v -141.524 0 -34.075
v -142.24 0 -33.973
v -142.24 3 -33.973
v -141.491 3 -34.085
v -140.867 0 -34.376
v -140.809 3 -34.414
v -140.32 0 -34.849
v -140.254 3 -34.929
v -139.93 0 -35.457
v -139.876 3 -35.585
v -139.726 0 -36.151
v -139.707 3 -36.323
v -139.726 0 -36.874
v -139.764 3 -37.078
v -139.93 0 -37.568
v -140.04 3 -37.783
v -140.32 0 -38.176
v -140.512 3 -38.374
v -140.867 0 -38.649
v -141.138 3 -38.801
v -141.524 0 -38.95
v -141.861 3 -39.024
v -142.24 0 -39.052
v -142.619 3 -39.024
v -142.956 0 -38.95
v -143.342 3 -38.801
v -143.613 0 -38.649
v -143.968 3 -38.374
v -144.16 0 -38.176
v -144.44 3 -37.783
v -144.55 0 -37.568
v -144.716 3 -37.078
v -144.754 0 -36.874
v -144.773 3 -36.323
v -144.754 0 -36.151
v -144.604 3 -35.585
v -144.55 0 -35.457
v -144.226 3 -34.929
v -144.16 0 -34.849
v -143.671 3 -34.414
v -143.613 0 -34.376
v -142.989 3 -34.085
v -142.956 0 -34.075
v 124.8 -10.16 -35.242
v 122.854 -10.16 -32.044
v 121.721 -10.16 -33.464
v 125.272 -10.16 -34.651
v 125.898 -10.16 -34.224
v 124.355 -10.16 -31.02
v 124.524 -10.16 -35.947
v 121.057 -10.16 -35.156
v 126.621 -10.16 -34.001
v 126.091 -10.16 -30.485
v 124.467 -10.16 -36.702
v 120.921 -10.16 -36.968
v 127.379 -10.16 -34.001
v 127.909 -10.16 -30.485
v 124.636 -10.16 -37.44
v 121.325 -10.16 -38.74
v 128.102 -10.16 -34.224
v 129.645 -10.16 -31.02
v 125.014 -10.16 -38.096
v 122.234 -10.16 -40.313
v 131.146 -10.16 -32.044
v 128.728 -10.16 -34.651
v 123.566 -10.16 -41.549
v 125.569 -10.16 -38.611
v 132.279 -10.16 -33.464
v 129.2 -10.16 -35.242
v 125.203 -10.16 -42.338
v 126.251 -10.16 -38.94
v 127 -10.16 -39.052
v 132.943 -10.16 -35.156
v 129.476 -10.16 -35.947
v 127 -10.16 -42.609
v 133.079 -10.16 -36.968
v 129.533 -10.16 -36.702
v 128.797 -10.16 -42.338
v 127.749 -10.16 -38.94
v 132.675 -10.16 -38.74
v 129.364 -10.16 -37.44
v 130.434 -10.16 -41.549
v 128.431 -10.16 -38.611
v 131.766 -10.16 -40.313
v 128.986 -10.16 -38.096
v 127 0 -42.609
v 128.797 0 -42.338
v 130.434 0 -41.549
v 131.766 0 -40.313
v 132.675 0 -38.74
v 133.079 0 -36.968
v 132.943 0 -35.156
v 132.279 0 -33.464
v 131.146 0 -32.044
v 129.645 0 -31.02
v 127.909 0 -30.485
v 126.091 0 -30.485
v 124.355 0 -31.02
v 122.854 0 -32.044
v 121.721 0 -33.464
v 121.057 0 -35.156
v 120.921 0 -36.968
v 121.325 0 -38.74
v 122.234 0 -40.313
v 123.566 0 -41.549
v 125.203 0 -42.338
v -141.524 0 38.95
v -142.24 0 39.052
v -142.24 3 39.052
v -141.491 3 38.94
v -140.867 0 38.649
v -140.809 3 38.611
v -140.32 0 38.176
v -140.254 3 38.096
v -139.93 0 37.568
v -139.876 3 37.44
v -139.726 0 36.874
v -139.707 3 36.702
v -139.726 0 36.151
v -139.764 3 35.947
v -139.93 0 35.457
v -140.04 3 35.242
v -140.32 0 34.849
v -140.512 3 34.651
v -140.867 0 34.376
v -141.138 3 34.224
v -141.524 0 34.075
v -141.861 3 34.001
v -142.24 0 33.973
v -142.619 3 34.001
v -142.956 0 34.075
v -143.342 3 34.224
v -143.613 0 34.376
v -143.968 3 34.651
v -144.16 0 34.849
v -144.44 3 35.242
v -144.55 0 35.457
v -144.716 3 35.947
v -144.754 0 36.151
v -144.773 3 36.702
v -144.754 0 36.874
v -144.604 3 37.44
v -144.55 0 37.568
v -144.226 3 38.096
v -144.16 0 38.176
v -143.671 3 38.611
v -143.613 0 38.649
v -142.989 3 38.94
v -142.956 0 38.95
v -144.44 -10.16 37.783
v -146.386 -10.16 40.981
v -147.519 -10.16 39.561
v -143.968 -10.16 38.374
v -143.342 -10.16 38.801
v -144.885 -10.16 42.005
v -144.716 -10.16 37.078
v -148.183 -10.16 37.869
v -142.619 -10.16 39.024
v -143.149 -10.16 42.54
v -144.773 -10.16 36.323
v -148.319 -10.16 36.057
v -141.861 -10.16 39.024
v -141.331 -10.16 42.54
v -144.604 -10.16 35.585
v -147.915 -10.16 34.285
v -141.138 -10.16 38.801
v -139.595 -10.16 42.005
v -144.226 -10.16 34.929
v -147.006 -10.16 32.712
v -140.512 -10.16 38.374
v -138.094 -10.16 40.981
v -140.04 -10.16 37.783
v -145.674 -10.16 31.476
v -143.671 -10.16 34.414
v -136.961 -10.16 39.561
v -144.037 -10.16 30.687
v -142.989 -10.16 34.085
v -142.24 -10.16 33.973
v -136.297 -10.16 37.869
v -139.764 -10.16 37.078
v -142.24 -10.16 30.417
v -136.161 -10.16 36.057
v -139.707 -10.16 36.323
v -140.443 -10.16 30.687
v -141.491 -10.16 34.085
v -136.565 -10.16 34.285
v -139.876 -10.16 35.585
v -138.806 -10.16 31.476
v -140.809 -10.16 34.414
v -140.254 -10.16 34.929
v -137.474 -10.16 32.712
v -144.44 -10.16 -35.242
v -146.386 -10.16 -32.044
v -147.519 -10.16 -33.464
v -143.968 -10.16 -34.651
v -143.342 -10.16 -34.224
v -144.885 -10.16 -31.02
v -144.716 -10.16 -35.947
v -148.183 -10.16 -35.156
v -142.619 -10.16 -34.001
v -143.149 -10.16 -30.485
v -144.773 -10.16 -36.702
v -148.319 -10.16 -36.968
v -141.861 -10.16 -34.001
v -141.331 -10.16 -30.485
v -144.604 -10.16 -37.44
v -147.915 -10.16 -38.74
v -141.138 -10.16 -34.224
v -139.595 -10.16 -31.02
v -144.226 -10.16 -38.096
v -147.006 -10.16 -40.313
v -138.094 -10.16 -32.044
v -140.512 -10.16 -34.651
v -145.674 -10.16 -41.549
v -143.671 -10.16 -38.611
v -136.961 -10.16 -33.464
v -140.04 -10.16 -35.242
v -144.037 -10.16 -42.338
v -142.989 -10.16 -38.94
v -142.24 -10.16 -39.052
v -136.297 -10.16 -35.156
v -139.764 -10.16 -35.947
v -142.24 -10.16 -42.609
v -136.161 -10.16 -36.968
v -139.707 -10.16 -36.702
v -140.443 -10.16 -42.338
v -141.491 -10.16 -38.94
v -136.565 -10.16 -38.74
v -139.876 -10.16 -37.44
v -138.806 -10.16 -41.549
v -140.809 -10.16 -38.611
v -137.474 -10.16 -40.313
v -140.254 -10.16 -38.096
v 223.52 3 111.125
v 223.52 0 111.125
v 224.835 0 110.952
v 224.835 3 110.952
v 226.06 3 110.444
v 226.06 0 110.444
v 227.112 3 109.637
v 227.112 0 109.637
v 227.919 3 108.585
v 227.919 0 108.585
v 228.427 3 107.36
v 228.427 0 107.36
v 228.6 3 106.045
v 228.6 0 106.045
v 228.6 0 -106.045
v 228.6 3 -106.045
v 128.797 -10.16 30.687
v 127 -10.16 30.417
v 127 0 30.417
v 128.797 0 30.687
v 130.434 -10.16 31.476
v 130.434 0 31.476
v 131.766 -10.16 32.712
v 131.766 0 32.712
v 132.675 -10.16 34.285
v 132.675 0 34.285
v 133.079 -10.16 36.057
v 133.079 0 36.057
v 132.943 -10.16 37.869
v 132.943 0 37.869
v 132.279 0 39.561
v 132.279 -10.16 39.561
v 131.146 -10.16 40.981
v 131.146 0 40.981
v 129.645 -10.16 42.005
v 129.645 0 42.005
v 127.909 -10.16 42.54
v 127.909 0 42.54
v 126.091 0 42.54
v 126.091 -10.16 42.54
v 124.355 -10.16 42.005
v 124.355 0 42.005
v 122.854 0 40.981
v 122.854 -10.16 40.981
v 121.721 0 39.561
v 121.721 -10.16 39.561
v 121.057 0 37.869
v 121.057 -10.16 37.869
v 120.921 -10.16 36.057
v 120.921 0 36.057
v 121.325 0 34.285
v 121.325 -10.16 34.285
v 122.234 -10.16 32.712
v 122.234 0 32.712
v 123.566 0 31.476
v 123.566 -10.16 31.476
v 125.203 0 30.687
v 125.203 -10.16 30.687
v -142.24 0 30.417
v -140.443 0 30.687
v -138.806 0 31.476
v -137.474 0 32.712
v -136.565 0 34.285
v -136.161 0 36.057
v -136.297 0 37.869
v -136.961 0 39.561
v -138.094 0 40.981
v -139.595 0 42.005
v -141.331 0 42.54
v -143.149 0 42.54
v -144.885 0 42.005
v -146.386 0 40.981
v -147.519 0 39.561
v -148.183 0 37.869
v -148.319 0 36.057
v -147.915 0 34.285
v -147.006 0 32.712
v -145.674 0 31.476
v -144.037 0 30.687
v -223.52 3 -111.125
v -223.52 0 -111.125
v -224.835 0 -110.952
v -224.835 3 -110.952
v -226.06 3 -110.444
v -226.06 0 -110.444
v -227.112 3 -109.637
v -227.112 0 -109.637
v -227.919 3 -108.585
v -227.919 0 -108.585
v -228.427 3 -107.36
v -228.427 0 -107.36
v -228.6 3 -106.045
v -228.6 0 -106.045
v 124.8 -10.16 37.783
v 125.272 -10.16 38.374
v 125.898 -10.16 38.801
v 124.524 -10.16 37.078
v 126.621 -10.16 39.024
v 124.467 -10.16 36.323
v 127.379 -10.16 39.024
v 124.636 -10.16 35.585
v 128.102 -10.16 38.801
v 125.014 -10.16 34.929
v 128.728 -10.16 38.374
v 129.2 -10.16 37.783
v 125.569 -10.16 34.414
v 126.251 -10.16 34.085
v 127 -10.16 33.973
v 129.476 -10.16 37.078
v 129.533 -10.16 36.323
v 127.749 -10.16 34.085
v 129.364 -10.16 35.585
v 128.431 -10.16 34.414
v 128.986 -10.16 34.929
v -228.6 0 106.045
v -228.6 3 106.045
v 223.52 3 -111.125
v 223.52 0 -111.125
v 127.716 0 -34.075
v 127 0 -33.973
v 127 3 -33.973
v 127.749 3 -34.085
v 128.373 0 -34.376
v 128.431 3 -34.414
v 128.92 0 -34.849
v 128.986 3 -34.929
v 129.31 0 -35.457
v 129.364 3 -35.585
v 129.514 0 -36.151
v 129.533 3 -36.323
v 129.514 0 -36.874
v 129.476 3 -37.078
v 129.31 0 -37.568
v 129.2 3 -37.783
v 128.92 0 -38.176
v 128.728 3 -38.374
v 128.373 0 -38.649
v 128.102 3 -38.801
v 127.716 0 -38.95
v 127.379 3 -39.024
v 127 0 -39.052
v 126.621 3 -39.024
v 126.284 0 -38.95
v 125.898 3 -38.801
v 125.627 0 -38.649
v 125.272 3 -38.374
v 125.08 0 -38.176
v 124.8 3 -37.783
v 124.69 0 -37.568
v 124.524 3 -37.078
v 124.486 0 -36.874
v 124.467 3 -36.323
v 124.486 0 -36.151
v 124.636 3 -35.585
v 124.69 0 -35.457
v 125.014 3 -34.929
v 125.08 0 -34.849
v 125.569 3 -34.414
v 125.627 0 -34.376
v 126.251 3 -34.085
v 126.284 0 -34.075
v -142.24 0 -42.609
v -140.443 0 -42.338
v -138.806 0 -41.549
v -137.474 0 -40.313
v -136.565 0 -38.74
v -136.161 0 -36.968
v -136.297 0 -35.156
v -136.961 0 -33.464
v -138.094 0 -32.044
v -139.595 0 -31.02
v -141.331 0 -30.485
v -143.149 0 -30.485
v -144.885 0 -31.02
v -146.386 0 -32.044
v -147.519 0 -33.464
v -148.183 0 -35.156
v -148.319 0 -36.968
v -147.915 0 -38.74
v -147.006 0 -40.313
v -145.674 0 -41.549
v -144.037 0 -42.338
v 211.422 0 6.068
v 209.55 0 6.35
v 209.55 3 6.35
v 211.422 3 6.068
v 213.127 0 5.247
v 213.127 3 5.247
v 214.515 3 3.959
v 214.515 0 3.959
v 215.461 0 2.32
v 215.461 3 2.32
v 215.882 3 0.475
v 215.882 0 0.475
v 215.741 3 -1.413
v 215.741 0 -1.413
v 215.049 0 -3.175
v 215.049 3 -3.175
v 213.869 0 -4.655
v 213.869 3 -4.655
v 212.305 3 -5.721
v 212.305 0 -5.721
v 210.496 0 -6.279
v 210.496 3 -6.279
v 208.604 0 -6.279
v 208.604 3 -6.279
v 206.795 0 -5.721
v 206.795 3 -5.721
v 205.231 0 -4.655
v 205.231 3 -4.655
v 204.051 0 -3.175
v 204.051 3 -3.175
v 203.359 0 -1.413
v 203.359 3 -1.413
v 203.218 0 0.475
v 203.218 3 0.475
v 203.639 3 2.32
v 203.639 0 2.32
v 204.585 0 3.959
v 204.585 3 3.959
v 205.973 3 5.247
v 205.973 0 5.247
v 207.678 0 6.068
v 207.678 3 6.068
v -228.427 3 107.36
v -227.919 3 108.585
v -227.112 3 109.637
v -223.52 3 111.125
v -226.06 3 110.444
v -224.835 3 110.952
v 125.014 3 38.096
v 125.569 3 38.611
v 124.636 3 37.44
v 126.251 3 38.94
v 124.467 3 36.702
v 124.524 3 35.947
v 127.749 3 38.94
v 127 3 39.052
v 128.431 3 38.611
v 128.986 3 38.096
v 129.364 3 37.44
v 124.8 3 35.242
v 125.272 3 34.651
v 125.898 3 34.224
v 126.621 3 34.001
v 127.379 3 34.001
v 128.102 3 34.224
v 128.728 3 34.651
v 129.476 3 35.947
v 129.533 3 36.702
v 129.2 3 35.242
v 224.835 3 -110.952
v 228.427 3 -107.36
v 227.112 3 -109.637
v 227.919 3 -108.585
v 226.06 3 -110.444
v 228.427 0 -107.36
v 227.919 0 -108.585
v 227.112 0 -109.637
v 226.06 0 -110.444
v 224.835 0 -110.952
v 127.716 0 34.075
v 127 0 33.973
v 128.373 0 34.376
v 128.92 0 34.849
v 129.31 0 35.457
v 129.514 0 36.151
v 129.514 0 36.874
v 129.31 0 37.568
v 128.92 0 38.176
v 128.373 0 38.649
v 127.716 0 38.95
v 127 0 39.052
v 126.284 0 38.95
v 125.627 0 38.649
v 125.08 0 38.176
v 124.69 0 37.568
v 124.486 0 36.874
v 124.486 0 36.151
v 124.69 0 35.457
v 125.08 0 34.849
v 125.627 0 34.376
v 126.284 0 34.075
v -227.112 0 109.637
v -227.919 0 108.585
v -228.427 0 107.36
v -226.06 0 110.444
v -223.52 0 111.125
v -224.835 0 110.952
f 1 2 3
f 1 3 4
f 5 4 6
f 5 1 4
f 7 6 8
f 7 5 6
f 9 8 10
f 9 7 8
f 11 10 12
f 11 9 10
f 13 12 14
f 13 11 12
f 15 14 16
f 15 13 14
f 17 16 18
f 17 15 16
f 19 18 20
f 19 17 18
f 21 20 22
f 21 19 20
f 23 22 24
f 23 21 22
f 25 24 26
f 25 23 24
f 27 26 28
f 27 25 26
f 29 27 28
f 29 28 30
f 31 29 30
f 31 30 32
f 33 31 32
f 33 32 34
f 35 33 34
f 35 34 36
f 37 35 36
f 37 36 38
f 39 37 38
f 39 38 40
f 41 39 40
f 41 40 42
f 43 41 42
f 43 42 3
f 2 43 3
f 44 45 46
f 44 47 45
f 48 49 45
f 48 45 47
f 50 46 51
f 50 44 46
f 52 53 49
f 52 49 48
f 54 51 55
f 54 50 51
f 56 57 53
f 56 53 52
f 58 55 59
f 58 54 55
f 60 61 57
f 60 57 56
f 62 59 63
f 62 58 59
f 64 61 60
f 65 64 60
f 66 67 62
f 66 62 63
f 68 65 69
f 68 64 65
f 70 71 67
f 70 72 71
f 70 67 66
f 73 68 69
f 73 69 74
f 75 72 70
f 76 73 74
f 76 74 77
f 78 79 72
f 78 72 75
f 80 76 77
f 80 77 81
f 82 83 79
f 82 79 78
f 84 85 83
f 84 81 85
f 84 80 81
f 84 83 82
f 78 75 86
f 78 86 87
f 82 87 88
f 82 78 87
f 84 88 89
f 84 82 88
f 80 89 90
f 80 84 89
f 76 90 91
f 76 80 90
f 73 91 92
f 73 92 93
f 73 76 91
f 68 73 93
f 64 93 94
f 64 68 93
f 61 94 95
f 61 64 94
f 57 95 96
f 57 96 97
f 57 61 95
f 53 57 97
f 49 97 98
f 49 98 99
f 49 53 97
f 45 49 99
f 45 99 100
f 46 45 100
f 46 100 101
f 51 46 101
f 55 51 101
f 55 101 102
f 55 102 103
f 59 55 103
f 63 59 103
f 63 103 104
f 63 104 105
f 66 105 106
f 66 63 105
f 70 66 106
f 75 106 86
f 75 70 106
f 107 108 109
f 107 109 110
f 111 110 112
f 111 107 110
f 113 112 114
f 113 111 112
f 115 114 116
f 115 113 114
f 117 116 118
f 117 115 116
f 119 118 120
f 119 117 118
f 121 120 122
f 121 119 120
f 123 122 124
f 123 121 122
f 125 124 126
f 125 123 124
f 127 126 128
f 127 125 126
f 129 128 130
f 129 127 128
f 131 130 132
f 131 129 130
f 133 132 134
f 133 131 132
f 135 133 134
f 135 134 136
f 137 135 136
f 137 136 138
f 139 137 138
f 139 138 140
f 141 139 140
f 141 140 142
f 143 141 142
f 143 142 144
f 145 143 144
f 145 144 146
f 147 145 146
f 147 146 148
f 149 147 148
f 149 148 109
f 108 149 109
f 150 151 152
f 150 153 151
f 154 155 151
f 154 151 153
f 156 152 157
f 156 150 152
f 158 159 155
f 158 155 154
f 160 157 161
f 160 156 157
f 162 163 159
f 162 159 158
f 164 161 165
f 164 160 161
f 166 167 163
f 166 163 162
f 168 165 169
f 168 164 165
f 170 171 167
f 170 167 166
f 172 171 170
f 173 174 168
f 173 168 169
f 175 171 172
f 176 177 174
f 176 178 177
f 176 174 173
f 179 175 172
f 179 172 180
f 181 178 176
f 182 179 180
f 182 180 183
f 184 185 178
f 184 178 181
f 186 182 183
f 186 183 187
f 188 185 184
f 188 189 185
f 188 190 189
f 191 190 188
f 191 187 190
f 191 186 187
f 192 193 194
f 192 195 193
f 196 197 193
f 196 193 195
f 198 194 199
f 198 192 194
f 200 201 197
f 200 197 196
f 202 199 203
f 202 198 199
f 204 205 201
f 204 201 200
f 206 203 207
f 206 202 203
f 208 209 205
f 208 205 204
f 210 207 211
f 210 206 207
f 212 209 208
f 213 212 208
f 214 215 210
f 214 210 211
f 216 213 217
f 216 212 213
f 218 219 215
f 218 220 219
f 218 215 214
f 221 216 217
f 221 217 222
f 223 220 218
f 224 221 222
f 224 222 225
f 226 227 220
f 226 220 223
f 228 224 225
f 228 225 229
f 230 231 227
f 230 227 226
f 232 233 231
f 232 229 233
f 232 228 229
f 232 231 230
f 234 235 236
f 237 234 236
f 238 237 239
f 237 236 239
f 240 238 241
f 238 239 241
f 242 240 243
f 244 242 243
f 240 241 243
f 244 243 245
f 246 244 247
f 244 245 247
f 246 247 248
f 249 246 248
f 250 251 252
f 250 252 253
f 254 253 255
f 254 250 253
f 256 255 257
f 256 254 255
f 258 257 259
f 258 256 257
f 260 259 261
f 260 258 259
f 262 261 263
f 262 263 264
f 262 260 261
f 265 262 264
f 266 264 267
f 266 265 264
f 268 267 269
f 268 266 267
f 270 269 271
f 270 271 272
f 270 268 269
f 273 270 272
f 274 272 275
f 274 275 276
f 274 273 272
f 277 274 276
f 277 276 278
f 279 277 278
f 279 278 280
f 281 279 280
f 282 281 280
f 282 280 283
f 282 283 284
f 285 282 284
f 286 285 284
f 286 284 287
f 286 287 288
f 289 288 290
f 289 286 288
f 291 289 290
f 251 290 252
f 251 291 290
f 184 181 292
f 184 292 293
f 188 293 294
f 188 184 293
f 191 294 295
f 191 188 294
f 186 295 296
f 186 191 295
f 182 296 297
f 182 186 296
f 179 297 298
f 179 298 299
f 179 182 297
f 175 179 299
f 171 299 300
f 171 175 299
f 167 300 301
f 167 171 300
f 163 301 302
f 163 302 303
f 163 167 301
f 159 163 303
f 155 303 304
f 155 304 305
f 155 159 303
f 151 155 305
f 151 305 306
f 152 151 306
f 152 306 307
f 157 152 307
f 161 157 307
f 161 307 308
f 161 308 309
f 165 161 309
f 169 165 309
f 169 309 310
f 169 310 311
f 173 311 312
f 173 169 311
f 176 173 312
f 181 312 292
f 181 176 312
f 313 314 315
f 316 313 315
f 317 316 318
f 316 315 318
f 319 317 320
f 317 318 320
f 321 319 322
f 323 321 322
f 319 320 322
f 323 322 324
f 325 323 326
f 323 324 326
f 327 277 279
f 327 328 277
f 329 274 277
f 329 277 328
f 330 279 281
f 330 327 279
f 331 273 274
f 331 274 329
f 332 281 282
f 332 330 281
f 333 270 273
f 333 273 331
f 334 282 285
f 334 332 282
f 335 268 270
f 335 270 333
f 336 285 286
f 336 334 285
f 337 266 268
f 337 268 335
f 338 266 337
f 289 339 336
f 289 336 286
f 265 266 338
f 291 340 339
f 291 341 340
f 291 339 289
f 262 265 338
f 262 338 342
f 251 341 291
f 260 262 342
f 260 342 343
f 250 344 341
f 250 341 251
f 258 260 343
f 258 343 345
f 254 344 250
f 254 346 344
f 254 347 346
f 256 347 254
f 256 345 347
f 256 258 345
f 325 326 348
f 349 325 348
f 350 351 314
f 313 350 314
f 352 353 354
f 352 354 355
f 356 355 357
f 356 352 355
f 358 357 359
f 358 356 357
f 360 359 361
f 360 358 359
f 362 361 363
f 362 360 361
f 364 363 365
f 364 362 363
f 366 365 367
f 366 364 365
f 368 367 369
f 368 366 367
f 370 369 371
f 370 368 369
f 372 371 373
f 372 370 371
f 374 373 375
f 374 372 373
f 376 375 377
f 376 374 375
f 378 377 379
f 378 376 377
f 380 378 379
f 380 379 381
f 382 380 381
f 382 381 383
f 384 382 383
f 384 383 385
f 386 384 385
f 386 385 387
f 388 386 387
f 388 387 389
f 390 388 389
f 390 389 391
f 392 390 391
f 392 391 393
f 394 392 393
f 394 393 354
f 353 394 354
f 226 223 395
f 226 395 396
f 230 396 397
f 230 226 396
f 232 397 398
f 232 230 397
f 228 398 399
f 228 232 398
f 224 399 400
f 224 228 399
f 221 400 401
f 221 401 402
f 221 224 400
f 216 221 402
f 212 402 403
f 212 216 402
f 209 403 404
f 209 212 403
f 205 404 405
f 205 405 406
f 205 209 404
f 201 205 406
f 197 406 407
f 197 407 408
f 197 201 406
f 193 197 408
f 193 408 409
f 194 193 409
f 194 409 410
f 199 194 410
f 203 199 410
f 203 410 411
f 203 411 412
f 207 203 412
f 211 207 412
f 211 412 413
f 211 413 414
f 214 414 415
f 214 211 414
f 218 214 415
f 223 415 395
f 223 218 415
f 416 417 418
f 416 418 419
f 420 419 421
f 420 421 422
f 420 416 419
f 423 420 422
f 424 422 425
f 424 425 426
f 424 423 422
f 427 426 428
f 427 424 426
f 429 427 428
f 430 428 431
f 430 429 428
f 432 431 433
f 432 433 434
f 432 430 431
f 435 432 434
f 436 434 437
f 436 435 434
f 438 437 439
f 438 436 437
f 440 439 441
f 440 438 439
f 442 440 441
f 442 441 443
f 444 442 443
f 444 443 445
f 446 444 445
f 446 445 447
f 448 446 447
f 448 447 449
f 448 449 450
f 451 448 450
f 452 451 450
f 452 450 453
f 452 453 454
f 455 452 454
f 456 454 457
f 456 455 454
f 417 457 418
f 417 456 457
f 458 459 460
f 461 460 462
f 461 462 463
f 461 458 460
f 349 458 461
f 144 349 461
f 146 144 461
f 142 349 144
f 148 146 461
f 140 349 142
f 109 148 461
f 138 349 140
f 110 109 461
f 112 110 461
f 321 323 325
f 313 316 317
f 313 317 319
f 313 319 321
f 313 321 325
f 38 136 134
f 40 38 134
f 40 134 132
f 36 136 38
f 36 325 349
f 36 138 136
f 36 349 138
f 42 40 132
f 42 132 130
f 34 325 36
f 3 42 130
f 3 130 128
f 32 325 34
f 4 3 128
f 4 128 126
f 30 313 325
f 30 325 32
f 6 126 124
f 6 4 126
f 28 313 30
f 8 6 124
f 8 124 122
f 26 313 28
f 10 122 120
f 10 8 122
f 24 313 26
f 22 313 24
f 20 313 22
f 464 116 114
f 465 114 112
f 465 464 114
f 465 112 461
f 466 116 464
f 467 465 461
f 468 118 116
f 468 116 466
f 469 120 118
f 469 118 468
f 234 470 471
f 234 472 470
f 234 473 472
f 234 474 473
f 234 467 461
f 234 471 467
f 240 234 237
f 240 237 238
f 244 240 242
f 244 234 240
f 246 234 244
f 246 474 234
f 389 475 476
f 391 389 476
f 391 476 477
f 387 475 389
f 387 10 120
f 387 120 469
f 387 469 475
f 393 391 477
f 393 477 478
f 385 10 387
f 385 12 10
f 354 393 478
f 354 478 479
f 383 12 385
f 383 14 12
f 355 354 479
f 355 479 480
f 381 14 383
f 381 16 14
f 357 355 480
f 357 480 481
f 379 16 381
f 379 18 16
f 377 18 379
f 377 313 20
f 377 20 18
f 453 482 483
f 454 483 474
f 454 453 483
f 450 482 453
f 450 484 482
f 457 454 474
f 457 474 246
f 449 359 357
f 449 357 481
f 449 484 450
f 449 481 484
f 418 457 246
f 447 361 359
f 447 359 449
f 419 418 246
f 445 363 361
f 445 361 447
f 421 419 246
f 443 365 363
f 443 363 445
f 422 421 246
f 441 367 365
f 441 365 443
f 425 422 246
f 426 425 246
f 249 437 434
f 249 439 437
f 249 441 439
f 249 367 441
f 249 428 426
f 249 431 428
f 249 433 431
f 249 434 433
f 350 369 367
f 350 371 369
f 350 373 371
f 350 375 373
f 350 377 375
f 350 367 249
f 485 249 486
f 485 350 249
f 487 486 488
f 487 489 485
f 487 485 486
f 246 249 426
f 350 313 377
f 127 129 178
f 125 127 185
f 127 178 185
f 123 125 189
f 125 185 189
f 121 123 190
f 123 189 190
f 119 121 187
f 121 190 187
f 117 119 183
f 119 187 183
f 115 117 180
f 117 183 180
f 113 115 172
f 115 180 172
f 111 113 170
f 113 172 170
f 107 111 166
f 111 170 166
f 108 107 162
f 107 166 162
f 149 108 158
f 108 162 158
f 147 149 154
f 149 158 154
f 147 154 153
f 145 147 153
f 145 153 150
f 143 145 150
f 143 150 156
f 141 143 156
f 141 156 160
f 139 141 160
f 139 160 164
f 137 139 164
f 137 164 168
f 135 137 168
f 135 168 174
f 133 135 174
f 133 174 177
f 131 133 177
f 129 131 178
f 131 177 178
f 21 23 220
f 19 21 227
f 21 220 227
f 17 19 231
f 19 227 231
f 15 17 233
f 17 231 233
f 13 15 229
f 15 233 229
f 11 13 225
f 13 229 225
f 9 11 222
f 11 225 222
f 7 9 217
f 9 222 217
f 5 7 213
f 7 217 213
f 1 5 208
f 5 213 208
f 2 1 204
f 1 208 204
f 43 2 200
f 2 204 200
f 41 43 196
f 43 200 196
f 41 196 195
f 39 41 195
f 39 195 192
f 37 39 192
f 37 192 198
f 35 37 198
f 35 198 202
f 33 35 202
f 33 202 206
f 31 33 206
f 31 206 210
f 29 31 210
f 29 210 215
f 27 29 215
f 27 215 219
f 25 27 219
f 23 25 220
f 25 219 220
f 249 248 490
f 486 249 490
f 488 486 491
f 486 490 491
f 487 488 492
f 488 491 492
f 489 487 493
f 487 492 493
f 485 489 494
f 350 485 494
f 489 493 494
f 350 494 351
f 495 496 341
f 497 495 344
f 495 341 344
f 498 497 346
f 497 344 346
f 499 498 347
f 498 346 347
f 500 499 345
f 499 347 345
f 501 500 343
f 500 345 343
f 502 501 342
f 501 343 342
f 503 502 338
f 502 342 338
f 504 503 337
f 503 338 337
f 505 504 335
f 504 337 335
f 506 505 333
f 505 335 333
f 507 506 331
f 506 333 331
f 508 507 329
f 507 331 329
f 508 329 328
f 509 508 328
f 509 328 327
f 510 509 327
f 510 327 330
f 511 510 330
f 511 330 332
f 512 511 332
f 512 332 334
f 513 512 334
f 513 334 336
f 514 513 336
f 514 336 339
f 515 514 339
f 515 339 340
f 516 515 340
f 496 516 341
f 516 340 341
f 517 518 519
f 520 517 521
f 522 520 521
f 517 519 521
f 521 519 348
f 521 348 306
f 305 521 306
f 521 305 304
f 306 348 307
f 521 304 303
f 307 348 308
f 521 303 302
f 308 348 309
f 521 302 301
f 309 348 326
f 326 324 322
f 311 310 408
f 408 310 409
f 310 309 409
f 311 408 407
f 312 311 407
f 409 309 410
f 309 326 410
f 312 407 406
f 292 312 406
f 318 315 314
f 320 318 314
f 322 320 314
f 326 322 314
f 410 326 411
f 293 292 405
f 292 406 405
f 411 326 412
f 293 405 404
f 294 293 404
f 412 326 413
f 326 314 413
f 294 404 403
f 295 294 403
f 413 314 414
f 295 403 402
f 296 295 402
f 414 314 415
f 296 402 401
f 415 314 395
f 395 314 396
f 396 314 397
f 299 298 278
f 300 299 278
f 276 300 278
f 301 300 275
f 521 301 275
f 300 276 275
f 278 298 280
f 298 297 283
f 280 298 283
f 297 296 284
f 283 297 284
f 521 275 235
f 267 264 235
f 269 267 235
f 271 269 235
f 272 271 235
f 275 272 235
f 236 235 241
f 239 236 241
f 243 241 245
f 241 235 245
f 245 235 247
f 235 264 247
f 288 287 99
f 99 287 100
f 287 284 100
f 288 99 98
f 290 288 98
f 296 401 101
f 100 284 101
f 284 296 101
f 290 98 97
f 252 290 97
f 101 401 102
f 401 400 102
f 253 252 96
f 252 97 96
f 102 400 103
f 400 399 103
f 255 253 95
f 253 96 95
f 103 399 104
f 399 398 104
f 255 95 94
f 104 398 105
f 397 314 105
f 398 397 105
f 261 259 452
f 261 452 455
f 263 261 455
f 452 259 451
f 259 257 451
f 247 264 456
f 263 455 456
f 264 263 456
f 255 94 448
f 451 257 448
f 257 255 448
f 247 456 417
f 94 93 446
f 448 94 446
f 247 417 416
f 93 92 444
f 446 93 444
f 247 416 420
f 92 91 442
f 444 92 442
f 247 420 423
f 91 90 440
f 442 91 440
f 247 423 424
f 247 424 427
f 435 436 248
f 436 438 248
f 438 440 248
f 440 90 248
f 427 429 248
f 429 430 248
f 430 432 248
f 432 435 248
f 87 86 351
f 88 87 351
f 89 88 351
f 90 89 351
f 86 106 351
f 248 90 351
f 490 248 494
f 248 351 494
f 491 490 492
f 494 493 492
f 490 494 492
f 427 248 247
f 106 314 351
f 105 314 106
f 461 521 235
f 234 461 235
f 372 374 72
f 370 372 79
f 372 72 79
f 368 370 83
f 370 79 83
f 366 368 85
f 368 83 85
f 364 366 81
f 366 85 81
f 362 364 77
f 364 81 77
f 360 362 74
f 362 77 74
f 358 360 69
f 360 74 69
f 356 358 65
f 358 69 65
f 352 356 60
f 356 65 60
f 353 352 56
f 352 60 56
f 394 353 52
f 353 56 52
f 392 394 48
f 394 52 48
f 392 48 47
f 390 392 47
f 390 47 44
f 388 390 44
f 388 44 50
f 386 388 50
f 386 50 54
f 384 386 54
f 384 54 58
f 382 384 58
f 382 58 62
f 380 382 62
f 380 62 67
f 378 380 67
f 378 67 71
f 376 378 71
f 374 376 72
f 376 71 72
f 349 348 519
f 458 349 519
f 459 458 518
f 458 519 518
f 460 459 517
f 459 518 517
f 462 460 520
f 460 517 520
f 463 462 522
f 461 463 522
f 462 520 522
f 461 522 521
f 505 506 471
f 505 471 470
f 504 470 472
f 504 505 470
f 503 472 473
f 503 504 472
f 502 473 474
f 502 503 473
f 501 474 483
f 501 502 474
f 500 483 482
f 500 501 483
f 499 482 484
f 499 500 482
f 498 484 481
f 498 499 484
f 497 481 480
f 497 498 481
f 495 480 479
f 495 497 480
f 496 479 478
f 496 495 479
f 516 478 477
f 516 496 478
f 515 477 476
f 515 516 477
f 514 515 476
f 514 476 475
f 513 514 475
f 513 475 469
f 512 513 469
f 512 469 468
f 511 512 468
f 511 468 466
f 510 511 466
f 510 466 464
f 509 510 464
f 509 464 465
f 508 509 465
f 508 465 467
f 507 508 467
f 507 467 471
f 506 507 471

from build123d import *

# Parameters (mm, degrees)
SKETCH1_R               = 2.54
SKETCH1_R_2             = 6.35
MAINBASEPLATE_DEPTH     = 3
BASEBOSS_EXTRUDE2_START = 10.16
SKETCH2_R               = 6.096
SKETCH2_R_2             = 2.54
BASEBOSS_EXTRUDE2_DEPTH = 10.16


with BuildPart() as part:
    # Sketch1 → mainbaseplate (new body)
    with BuildSketch(Plane(origin=(0, 0, 0), x_dir=(1, 0, 0), z_dir=(0, 1, 0))):
        with BuildLine():
            Line((-223.52, -111.125), (223.52, -111.125))
            ThreePointArc((223.52, -111.125), (227.112102448, -109.637102448), (228.6, -106.045))
            Line((228.6, -106.045), (228.6, 106.045))
            ThreePointArc((228.6, 106.045), (227.112102448, 109.637102448), (223.52, 111.125))
            Line((223.52, 111.125), (-223.52, 111.125))
            ThreePointArc((-223.52, 111.125), (-227.112102448, 109.637102448), (-228.6, 106.045))
            Line((-228.6, 106.045), (-228.6, -106.045))
            ThreePointArc((-228.6, -106.045), (-227.112102448, -109.637102448), (-223.52, -111.125))
        make_face()
        with Locations((127, 36.5125)):
            Circle(SKETCH1_R, mode=Mode.SUBTRACT)
        with Locations((127, -36.5125)):
            Circle(SKETCH1_R, mode=Mode.SUBTRACT)
        with Locations((-142.24, 36.5125)):
            Circle(SKETCH1_R, mode=Mode.SUBTRACT)
        with Locations((-142.24, -36.5125)):
            Circle(SKETCH1_R, mode=Mode.SUBTRACT)
        with Locations((209.55, 0)):
            Circle(SKETCH1_R_2, mode=Mode.SUBTRACT)
    extrude(amount=MAINBASEPLATE_DEPTH)

    # Sketch2 → BaseBoss-Extrude2 (add)
    # profile 1 of 4: a face of its own
    with BuildSketch(Plane.XZ.offset(BASEBOSS_EXTRUDE2_START)):
        with Locations((127, 36.5125)):
            Circle(SKETCH2_R)
        with Locations((127, 36.5125)):
            Circle(SKETCH2_R_2, mode=Mode.SUBTRACT)
    # profile 2 of 4: a face of its own
    with BuildSketch(Plane.XZ.offset(BASEBOSS_EXTRUDE2_START)):
        with Locations((127, -36.5125)):
            Circle(SKETCH2_R)
        with Locations((127, -36.5125)):
            Circle(SKETCH2_R_2, mode=Mode.SUBTRACT)
    # profile 3 of 4: a face of its own
    with BuildSketch(Plane.XZ.offset(BASEBOSS_EXTRUDE2_START)):
        with Locations((-142.24, -36.5125)):
            Circle(SKETCH2_R)
        with Locations((-142.24, -36.5125)):
            Circle(SKETCH2_R_2, mode=Mode.SUBTRACT)
    # profile 4 of 4: a face of its own
    with BuildSketch(Plane.XZ.offset(BASEBOSS_EXTRUDE2_START)):
        with Locations((-142.24, 36.5125)):
            Circle(SKETCH2_R)
        with Locations((-142.24, 36.5125)):
            Circle(SKETCH2_R_2, mode=Mode.SUBTRACT)
    extrude(amount=-BASEBOSS_EXTRUDE2_DEPTH)


solid = part.part
